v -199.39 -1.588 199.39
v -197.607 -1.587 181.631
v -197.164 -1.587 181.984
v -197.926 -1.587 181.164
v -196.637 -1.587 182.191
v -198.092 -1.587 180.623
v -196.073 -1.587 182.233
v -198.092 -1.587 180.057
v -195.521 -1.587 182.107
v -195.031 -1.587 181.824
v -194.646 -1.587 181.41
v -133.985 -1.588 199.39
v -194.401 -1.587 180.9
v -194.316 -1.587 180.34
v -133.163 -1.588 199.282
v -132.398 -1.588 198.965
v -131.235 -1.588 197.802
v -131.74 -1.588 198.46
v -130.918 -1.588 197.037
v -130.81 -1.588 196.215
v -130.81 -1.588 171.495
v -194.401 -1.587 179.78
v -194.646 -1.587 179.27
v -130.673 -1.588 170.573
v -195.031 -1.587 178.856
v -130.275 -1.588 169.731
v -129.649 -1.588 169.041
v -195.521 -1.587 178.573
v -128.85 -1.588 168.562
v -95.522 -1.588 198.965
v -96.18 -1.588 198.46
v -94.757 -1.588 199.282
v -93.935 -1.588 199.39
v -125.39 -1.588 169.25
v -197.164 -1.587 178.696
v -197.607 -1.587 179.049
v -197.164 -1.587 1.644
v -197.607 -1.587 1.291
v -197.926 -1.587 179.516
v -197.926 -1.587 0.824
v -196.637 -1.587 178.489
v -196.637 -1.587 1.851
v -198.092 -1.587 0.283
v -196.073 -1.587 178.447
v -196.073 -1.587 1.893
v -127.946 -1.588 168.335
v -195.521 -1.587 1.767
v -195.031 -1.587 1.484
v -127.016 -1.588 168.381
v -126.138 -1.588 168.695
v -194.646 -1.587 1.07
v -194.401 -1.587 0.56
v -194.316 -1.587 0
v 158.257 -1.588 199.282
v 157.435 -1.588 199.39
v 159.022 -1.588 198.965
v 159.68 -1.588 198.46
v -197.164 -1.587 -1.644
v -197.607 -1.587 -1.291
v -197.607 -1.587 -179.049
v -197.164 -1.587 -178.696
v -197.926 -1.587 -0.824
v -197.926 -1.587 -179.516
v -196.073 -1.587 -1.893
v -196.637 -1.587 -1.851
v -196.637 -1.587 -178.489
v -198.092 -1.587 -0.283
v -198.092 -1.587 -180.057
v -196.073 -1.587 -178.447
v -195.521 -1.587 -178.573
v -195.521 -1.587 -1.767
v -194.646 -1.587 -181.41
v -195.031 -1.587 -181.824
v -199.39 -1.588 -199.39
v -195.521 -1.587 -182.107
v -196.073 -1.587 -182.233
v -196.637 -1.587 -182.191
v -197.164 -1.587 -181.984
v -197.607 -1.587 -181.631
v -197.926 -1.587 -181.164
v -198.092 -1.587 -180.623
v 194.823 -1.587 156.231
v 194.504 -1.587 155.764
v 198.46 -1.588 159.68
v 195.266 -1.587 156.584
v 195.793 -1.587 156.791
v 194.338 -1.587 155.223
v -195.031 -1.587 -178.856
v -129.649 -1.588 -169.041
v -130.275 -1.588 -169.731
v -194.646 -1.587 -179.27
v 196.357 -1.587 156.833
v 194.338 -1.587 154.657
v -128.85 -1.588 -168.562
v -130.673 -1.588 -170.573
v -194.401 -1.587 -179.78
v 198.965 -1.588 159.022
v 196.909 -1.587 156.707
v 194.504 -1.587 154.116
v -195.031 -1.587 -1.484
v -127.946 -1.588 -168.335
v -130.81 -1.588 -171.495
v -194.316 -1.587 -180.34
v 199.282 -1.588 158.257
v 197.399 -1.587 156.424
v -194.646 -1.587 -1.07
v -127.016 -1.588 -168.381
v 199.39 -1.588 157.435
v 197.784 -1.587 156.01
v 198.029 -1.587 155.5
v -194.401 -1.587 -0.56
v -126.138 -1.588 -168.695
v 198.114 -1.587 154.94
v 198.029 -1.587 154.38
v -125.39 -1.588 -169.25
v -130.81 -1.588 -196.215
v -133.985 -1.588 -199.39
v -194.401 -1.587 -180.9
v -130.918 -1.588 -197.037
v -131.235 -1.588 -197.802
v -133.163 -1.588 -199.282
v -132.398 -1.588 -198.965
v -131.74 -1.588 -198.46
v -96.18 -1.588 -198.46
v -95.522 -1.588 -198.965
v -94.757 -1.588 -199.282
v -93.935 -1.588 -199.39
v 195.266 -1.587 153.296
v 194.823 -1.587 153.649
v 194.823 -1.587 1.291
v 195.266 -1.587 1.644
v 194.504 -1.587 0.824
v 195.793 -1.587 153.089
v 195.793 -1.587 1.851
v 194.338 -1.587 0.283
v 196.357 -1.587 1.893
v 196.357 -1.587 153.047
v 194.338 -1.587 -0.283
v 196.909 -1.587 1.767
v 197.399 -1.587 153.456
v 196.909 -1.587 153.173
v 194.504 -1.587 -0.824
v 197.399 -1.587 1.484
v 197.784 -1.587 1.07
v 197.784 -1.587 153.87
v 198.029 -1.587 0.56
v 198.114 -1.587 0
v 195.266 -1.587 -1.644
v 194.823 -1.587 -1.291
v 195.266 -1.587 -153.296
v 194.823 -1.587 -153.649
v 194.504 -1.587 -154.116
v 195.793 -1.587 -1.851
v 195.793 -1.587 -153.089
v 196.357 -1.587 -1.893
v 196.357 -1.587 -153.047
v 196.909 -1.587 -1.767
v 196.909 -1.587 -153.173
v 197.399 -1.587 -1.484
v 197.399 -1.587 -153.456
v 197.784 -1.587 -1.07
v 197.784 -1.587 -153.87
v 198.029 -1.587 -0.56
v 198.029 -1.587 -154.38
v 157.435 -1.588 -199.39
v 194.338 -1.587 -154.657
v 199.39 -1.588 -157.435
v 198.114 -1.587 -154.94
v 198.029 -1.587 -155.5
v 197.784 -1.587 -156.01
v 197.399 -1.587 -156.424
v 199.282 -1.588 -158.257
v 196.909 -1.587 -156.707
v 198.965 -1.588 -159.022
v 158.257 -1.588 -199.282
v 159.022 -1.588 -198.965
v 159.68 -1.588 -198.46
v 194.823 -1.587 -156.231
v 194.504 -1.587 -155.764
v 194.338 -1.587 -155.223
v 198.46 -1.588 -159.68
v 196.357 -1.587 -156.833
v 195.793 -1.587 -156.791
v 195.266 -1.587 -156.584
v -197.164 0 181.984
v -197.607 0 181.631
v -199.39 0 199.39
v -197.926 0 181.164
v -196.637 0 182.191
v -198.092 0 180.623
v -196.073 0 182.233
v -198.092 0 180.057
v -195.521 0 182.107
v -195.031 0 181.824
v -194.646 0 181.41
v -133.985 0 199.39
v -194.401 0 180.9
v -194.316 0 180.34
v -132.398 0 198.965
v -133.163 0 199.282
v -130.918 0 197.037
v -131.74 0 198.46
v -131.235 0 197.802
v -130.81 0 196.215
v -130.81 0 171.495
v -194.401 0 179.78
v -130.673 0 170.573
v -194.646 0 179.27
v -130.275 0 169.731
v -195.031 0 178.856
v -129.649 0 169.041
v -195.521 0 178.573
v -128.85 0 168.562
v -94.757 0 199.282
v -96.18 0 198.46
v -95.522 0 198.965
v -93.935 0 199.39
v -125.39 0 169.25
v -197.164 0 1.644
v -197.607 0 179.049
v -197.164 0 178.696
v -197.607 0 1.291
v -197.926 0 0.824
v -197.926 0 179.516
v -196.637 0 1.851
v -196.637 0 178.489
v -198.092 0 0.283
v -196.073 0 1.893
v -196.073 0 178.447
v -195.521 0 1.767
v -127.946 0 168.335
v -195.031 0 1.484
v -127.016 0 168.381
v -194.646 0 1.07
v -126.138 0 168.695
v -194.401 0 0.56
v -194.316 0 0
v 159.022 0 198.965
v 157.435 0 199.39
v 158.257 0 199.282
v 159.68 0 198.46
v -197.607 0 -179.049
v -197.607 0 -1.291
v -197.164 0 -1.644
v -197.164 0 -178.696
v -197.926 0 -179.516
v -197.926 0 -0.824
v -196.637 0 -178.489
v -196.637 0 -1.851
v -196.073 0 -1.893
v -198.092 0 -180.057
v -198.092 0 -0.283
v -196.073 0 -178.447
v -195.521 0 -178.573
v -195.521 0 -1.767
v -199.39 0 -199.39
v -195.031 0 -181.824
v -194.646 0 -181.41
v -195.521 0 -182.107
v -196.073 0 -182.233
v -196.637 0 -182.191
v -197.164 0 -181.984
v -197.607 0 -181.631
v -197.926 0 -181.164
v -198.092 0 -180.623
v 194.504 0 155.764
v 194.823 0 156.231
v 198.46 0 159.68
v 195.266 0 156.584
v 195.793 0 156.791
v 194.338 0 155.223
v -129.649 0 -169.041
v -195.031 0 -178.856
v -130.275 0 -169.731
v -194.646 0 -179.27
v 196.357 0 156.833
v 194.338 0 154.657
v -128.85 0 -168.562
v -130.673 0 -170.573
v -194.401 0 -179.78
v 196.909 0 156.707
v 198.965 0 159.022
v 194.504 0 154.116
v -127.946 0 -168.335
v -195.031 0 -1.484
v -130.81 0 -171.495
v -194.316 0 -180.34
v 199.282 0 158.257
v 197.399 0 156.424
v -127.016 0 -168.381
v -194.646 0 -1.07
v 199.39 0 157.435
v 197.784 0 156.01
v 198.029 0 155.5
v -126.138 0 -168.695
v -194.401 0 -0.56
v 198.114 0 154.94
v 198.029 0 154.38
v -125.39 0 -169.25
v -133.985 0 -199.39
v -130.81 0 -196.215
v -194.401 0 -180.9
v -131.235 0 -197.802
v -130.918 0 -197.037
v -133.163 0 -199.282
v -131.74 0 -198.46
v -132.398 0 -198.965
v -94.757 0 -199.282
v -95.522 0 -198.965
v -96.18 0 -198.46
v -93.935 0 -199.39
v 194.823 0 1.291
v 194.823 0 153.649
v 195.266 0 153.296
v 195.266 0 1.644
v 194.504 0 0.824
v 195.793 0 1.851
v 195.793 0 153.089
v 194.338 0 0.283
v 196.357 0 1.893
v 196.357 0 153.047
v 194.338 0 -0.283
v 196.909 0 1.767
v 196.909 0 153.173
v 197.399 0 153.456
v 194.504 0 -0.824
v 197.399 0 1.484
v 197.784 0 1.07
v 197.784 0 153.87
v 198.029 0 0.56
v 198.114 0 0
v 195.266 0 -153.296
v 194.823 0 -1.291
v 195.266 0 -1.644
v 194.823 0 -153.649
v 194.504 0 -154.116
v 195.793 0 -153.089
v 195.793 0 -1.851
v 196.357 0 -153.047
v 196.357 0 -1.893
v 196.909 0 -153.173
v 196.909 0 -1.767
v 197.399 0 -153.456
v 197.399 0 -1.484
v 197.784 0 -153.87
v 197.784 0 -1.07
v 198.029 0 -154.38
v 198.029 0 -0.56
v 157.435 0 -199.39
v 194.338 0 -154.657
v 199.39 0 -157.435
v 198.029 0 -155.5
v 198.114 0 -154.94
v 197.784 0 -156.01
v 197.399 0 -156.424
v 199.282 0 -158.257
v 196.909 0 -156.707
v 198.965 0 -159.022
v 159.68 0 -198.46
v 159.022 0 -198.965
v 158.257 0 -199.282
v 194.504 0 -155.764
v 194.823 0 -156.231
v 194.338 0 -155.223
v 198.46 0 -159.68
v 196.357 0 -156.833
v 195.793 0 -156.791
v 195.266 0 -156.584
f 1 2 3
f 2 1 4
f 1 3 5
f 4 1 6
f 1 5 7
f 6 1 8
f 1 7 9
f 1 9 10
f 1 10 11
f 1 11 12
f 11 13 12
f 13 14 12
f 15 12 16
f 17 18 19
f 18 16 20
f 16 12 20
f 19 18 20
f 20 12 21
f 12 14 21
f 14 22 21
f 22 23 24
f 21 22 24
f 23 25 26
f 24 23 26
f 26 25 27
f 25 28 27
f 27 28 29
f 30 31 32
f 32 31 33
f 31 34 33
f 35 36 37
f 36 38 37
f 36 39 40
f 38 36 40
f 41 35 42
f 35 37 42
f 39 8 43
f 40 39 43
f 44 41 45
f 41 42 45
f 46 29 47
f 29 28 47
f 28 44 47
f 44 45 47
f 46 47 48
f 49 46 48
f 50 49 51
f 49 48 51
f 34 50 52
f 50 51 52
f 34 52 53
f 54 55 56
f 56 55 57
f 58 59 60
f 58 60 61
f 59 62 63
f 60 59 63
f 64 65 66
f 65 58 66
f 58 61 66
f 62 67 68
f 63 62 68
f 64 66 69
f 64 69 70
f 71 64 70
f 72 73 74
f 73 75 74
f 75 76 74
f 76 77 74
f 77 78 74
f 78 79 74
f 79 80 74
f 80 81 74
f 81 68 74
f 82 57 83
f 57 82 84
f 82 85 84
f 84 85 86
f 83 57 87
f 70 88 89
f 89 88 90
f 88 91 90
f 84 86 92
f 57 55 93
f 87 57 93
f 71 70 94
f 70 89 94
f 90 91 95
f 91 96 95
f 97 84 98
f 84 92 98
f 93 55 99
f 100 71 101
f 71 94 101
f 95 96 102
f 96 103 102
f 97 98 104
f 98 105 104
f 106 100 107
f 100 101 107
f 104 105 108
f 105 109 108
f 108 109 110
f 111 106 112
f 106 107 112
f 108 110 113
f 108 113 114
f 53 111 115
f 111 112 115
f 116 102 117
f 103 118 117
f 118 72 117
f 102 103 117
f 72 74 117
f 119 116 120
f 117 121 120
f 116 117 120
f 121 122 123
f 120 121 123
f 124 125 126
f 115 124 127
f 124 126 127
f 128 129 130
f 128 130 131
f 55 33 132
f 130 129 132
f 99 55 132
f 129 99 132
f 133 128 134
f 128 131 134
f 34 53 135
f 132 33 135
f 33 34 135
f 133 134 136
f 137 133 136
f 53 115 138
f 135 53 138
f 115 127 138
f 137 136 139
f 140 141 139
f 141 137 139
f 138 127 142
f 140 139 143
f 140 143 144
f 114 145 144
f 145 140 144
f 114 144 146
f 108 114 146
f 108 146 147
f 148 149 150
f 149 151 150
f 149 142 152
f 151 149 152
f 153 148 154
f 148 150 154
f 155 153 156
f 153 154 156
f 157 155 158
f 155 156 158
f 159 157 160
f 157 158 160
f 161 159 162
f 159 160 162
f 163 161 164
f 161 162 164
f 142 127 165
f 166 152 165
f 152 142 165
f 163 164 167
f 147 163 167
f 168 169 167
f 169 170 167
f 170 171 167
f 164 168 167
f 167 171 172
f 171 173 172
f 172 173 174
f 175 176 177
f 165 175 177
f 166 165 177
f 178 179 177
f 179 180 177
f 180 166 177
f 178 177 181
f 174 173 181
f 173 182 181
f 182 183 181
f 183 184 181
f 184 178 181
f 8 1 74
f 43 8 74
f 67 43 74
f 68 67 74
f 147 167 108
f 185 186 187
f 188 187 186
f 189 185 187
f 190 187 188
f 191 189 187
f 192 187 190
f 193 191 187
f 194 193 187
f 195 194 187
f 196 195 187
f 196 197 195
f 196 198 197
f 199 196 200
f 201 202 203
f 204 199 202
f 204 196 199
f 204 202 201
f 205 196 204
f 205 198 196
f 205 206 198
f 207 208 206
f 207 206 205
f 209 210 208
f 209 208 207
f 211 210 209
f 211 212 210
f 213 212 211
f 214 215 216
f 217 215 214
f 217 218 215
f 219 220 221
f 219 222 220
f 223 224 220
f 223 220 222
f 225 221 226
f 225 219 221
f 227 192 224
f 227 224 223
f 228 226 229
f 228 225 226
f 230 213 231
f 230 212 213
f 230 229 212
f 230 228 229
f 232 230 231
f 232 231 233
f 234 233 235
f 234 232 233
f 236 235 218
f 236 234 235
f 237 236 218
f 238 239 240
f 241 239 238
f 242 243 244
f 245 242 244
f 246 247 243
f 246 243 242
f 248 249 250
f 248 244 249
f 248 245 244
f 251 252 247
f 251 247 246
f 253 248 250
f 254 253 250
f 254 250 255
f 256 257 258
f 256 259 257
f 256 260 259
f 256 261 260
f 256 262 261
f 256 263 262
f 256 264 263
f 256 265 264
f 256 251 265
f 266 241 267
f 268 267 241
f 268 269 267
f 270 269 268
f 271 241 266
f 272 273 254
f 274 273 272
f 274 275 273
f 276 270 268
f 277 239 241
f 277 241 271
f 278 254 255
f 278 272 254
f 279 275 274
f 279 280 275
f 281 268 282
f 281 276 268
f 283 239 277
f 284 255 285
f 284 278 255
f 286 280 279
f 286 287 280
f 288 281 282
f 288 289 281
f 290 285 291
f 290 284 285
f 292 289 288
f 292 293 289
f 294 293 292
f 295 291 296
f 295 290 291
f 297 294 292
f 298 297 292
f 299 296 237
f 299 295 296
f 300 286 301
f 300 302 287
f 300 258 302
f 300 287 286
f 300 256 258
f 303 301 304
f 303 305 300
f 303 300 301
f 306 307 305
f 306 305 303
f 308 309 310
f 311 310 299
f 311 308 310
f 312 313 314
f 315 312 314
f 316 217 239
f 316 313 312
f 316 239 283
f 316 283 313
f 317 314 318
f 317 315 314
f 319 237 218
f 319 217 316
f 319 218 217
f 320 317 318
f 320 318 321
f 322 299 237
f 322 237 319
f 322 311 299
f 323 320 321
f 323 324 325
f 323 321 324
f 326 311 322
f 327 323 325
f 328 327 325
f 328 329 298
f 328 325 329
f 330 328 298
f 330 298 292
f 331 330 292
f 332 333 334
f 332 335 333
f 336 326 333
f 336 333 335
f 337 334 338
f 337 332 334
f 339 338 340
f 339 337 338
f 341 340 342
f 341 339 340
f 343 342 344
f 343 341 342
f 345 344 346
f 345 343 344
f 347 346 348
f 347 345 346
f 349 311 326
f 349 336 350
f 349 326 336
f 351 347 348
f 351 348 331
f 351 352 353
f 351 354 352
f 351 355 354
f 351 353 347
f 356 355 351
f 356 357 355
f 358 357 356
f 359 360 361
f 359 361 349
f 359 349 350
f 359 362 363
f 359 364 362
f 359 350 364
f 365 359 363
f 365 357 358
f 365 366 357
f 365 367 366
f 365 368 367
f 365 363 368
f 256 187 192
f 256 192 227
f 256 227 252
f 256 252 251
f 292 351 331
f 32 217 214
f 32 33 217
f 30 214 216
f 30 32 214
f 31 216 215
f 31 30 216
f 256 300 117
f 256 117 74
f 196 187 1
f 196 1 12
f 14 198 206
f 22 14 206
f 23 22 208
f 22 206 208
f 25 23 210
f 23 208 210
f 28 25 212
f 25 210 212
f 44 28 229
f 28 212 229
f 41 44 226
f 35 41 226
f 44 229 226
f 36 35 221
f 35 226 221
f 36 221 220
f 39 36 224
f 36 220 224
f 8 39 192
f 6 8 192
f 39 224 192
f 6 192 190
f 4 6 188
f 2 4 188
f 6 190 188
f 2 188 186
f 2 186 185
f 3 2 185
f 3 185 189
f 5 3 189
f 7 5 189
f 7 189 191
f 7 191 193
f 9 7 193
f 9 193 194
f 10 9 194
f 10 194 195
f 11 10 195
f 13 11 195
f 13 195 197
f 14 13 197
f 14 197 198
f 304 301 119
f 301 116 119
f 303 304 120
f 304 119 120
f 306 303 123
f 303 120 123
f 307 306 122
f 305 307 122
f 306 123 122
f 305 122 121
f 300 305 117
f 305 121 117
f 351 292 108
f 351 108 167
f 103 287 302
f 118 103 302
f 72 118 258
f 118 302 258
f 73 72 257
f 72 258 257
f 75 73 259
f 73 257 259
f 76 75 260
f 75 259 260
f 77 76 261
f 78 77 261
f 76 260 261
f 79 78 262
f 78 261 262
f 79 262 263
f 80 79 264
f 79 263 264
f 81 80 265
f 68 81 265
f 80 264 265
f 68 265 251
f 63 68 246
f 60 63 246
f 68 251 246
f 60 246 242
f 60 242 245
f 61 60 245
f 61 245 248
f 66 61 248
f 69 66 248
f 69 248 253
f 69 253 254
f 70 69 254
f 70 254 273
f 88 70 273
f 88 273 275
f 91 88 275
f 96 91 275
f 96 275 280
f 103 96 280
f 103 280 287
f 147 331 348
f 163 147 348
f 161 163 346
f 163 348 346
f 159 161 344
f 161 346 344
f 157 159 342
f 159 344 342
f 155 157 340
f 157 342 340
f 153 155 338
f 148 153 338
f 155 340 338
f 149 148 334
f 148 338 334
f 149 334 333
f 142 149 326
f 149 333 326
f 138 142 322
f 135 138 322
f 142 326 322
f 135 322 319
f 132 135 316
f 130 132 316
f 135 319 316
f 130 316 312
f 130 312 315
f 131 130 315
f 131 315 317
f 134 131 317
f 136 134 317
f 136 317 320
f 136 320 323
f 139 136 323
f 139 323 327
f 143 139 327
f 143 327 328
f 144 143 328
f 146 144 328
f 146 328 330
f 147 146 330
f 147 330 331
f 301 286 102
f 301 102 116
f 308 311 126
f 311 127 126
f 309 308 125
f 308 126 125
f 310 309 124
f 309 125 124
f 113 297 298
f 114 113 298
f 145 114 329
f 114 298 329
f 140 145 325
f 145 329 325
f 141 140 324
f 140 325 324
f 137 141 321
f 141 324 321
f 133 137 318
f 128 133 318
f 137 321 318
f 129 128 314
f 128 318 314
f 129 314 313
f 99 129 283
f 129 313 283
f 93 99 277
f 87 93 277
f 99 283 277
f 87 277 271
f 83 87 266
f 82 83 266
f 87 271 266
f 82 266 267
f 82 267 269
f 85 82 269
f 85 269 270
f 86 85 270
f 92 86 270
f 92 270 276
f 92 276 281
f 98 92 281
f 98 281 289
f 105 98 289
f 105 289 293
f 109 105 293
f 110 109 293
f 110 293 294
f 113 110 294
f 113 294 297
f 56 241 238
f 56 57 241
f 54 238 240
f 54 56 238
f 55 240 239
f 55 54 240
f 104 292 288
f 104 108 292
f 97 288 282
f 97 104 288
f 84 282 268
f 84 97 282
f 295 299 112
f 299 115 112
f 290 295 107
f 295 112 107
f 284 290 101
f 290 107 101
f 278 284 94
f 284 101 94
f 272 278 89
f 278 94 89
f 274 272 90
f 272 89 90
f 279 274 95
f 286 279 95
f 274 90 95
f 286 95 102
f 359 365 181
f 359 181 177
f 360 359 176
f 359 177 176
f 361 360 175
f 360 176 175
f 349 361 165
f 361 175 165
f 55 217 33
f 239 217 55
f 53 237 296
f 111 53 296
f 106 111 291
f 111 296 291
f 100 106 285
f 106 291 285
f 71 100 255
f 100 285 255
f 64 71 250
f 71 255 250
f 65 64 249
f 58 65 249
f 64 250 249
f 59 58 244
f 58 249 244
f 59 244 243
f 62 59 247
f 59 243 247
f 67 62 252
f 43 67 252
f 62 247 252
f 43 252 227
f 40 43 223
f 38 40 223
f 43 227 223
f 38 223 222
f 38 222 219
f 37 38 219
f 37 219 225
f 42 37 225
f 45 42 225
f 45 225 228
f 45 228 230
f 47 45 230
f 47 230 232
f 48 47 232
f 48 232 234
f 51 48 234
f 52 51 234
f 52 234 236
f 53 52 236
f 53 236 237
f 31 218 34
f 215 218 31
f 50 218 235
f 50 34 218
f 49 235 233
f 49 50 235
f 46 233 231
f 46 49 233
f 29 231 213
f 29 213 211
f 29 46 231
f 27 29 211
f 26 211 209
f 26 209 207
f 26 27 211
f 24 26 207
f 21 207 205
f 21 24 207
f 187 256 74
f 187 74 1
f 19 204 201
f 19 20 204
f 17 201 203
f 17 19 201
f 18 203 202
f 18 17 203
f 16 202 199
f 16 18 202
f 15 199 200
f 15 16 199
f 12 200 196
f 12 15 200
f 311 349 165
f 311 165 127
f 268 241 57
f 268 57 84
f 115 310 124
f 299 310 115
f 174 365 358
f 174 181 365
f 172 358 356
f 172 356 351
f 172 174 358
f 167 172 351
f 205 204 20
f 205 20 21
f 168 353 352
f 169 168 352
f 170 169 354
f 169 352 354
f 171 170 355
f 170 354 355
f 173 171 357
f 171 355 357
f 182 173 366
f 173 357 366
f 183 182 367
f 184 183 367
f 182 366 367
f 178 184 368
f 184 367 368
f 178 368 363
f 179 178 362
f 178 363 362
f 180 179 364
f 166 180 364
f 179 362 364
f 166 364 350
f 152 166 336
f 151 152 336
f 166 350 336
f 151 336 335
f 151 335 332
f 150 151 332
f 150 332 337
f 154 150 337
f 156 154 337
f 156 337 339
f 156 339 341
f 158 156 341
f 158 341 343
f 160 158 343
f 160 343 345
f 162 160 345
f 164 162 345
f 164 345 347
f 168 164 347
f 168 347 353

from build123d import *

# Parameters (mm, degrees)
BOSS_EXTRUDE1_DEPTH   = 1.5875
F_6_CLEARANCE_HOLE1_D = 3.7973
FILLET1_R             = 3.175


with BuildPart() as part:
    # Sketch1 → Boss-Extrude1 (new body)
    with BuildSketch(Plane(origin=(0, 0, 0), x_dir=(1, 0, 0), z_dir=(0, 1, 0))):
        Polygon((199.39, 158.75), (158.75, 199.39), (-95.25, 199.39), (-130.81, 163.83), (-130.81, 199.39), (-199.39, 199.39), (-199.39, -199.39), (-130.81, -199.39), (-130.81, -163.83), (-95.25, -199.39), (158.75, -199.39), (199.39, -158.75), align=None)
    extrude(amount=-BOSS_EXTRUDE1_DEPTH)

    # #6 Clearance Hole1 (through all)
    with Locations(Plane(origin=(0, -1.5875, 0), x_dir=(-1, 0, 0), z_dir=(0, -1, 0))):
        with Locations((196.215, 180.34), (196.215, -180.34), (-196.215, -154.94), (-196.215, 154.94), (196.215, 0), (-196.215, 0)):
            Hole(F_6_CLEARANCE_HOLE1_D / 2)

    # Fillet1
    fillet1_edges = [part.edges().sort_by_distance(p)[0] for p in [
        (-130.81, -0.79375, 199.39),
        (-130.81, -0.79375, -199.39),
        (-130.81, -0.79375, -163.83),
        (-95.25, -0.79375, -199.39),
        (158.75, -0.79375, -199.39),
        (199.39, -0.79375, -158.75),
        (199.39, -0.79375, 158.75),
        (158.75, -0.79375, 199.39),
        (-95.25, -0.79375, 199.39),
        (-130.81, -0.79375, 163.83),
    ]]
    fillet(fillet1_edges, radius=FILLET1_R)


solid = part.part
